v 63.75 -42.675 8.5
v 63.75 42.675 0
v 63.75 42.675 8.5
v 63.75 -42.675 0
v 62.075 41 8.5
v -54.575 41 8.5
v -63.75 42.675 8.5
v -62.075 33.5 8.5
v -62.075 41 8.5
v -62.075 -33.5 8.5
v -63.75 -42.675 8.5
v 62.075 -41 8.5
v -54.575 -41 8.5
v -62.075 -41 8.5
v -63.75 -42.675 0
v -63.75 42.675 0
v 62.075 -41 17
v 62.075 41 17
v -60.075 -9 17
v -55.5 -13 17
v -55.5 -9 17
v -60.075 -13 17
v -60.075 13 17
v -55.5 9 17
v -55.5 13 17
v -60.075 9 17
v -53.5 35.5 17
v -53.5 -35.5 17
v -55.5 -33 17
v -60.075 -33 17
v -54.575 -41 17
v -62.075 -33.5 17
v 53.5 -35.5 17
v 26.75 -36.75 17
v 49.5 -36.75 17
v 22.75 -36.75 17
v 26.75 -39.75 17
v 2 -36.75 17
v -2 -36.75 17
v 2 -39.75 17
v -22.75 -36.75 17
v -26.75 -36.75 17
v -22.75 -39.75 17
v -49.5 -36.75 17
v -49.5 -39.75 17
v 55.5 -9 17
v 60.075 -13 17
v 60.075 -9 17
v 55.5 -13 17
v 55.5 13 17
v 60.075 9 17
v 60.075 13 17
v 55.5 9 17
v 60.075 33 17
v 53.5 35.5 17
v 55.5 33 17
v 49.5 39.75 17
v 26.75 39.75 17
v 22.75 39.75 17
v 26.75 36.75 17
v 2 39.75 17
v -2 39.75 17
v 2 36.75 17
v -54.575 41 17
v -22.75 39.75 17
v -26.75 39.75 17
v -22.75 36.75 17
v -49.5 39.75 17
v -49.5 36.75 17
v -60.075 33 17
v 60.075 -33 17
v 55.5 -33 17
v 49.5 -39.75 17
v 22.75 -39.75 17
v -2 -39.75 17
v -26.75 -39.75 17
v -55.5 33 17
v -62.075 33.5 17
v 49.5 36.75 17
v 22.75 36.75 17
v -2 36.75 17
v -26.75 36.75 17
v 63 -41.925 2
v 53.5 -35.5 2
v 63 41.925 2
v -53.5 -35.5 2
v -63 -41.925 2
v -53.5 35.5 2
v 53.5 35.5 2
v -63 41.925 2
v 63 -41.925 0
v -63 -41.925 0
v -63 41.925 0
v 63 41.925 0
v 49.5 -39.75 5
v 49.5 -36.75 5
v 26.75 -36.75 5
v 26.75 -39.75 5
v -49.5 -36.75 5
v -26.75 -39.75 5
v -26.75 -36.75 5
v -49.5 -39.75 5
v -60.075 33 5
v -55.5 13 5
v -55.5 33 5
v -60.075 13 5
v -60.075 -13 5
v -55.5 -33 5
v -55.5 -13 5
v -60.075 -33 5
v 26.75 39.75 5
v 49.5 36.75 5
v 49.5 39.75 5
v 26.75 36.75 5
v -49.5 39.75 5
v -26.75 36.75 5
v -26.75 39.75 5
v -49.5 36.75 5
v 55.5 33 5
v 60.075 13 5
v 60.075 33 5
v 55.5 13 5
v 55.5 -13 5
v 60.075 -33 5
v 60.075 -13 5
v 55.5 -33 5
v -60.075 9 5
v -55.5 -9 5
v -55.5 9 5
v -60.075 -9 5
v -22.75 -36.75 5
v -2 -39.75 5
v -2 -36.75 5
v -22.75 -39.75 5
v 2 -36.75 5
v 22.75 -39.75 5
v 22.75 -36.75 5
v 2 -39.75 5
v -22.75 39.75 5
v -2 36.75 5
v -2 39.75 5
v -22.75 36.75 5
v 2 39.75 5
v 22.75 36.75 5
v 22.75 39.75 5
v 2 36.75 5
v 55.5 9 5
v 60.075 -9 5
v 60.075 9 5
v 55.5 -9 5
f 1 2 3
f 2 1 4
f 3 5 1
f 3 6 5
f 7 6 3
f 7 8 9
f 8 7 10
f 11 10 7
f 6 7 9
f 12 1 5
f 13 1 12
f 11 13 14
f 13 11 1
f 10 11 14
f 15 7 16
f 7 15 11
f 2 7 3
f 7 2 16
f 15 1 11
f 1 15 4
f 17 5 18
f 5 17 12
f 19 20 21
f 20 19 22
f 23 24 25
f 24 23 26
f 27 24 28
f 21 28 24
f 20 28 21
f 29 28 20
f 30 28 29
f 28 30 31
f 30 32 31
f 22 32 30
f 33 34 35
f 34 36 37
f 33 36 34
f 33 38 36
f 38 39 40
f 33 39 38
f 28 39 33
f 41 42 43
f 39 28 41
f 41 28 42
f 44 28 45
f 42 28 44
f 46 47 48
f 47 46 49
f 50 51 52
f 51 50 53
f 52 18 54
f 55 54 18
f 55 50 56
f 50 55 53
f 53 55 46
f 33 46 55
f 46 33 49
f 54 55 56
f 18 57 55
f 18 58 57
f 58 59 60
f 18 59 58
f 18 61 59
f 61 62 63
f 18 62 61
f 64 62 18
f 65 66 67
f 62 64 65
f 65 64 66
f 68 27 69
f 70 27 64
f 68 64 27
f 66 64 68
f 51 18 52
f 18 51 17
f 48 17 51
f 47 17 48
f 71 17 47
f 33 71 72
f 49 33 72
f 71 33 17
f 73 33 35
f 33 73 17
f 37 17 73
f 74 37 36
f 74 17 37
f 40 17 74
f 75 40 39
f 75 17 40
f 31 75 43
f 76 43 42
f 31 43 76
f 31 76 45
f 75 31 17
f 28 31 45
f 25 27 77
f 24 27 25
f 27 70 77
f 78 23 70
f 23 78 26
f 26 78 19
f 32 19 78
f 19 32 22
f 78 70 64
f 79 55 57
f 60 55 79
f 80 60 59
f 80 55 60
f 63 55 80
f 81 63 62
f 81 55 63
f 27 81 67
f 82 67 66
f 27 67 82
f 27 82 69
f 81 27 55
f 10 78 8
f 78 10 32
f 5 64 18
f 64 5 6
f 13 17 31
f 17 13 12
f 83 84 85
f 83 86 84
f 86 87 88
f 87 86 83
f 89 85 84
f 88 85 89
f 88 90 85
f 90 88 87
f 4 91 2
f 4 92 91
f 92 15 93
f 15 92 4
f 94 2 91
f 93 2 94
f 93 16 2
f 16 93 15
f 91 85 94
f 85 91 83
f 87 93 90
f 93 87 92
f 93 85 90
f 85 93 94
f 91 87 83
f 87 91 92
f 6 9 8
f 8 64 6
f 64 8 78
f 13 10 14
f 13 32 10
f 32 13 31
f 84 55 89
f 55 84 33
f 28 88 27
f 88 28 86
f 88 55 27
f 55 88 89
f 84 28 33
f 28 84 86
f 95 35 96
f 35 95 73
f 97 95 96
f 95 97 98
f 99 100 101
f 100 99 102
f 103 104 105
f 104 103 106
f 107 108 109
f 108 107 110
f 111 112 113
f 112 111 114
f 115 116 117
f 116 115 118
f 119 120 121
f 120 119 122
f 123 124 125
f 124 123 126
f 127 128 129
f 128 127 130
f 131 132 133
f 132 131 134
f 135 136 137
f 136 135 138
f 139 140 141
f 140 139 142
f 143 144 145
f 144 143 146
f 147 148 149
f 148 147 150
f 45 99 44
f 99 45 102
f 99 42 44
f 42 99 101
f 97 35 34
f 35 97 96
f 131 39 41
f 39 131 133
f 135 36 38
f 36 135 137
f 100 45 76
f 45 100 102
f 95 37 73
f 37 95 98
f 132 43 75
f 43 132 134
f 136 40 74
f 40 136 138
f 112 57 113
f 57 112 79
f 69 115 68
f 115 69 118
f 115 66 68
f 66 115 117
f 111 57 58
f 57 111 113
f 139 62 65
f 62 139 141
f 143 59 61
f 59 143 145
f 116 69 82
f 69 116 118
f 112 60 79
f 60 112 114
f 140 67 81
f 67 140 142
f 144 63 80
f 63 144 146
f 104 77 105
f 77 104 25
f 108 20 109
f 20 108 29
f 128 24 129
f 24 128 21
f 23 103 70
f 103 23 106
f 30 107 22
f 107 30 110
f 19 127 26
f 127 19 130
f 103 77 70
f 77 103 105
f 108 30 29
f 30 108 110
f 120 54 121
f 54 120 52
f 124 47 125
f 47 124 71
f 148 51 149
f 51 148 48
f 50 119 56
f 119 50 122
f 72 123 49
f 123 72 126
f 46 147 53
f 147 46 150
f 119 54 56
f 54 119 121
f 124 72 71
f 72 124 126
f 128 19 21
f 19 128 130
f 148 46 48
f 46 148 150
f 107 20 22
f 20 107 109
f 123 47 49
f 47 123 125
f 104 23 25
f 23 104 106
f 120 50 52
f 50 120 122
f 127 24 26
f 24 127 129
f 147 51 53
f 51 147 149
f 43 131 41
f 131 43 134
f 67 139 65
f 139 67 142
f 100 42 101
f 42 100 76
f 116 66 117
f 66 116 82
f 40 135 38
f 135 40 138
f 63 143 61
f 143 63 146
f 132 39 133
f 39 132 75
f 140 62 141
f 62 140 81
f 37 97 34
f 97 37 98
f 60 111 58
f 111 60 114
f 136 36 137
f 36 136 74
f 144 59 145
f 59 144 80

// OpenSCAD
// Generated by SolidPython 1.1.3 on 2024-11-01 12:00:23


difference() {
	union() {
		translate(v = [0, 22.0000000000, 0]) {
			translate(v = [0, -33.0000000000, 11.0000000000]) {
				cube(center = true, size = [124.1500000000, 4, 12]);
			}
		}
		translate(v = [0, 44.0000000000, 0]) {
			translate(v = [0, -33.0000000000, 11.0000000000]) {
				cube(center = true, size = [124.1500000000, 4, 12]);
			}
		}
		translate(v = [24.7500000000, 0, 0]) {
			translate(v = [-49.5000000000, 0, 11.0000000000]) {
				cube(center = true, size = [4, 82, 12]);
			}
		}
		translate(v = [49.5000000000, 0, 0]) {
			translate(v = [-49.5000000000, 0, 11.0000000000]) {
				cube(center = true, size = [4, 82, 12]);
			}
		}
		translate(v = [74.2500000000, 0, 0]) {
			translate(v = [-49.5000000000, 0, 11.0000000000]) {
				cube(center = true, size = [4, 82, 12]);
			}
		}
		difference() {
			difference() {
				difference() {
					difference() {
						union() {
							difference() {
								union() {
									translate(v = [0, 0, 4.2500000000]) {
										cube(center = true, size = [127.5000000000, 85.3500000000, 8.5000000000]);
									}
									translate(v = [0, 0, 12.7500000000]) {
										cube(center = true, size = [124.1500000000, 82, 8.5000000000]);
									}
								}
								translate(v = [0, 0, 1.0000000000]) {
									cube(center = true, size = [127.5000000000, 85.3500000000, 2]);
								}
							}
							intersection() {
								difference() {
									translate(v = [0, 0, 1.0000000000]) {
										cube(center = true, size = [127.5000000000, 85.3500000000, 2]);
									}
									translate(v = [0, 0, 1.0000000000]) {
										cube(center = true, size = [126.0000000000, 83.8500000000, 2]);
									}
								}
								union() {
									translate(v = [-63.7500000000, 42.6750000000, 0]) {
										translate(v = [0, 0, 1.0000000000]) {
											cube(center = true, size = [127.5000000000, 85.3500000000, 2]);
										}
									}
									translate(v = [63.7500000000, 42.6750000000, 0]) {
										translate(v = [0, 0, 1.0000000000]) {
											cube(center = true, size = [127.5000000000, 85.3500000000, 2]);
										}
									}
									translate(v = [-63.7500000000, -42.6750000000, 0]) {
										translate(v = [0, 0, 1.0000000000]) {
											cube(center = true, size = [127.5000000000, 85.3500000000, 2]);
										}
									}
									translate(v = [63.7500000000, -42.6750000000, 0]) {
										translate(v = [0, 0, 1.0000000000]) {
											cube(center = true, size = [127.5000000000, 85.3500000000, 2]);
										}
									}
								}
							}
						}
						union() {
							translate(v = [-62.0750000000, 41.0000000000, 8.5000000000]) {
								translate(v = [0, -7.5000000000, 0]) {
									linear_extrude(height = 8.5000000000) {
										polygon(points = [[0, 0], [0, 7.5000000000], [0, 7.5000000000], [0, 7.5000000000], [7.5000000000, 7.5000000000], [7.5000000000, 7.5000000000]]);
									}
								}
							}
							translate(v = [-62.0750000000, -41.0000000000, 8.5000000000]) {
								translate(v = [7.5000000000, 0, 0]) {
									rotate(a = 90) {
										linear_extrude(height = 8.5000000000) {
											polygon(points = [[0, 0], [0, 7.5000000000], [0, 7.5000000000], [0, 7.5000000000], [7.5000000000, 7.5000000000], [7.5000000000, 7.5000000000]]);
										}
									}
								}
							}
						}
					}
					translate(v = [0, 0, 8.5000000000]) {
						cube(center = true, size = [107, 71, 17.0000000000]);
					}
				}
				union() {
					translate(v = [0, -38.25, 0]) {
						translate(v = [0, 0, 11.0000000000]) {
							cube(center = true, size = [99, 3.0000000000, 12]);
						}
					}
					translate(v = [0, 38.25, 0]) {
						translate(v = [0, 0, 11.0000000000]) {
							cube(center = true, size = [99, 3.0000000000, 12]);
						}
					}
					translate(v = [-57.7875, 0, 0]) {
						translate(v = [0, 0, 11.0000000000]) {
							cube(center = true, size = [4.5750000000, 66, 12]);
						}
					}
					translate(v = [57.7875, 0, 0]) {
						translate(v = [0, 0, 11.0000000000]) {
							cube(center = true, size = [4.5750000000, 66, 12]);
						}
					}
				}
			}
			union() {
				translate(v = [0, 0, 17.0000000000]) {
					cube(center = true, size = [115.575, 66, 0]);
				}
				translate(v = [0, 0, 17.0000000000]) {
					cube(center = true, size = [99, 76.5, 0]);
				}
			}
		}
	}
	translate(v = [0, 0, 8.5000000000]) {
		cube(center = true, size = [107, 71, 17.0000000000]);
	}
}
/***********************************************
*********      SolidPython code:      **********
************************************************
 
import solid
import numpy as np
from make_device import make_unit_array
import os.path as osp
import os 
import math

chamfer_extrude=solid.import_scad("./chamfer_extrude.scad")
chamfer_extrude=chamfer_extrude.chamfer_extrude
version="print_PP_v1"
base_name="96_well_plate_reservoirs_"+version
base_path="./plates/"+base_name
#basic plate dims
plate_size_outer=[127.5,85.35]
plate_size_inner=[124.15,82]
plate_height_outer=8.5
plate_height_inner=8.5
plate_height=plate_height_inner+plate_height_outer
plate_under_depth=2
skirt_thickness=1.5
skirt_hole_dims=[plate_size_outer[0],plate_size_outer[1]]
corner_x=7.5
corner_y=7.5
grid_size=[1,1]
#device_tol=2
#dims = [110-device_tol,74-device_tol,0]
#device_dims=[110-device_tol,74-device_tol]
dims = [107,71,0]
device_dims=[107,71]
reservoir_x_tol=8
reservoir_y_tol=5
reservoir_dims_x=[device_dims[0]-reservoir_x_tol,(plate_size_inner[1]-device_dims[1]-reservoir_y_tol)/2.0]
reservoir_dims_y=[(plate_size_inner[0]-device_dims[0]-reservoir_x_tol)/2.0,device_dims[1]-reservoir_y_tol]
reservoir_depth=12
lower_wall_height=0
release_holes=False
release_radius=2.5
reservoir_number_x=3
reservoir_number_y=4
reservoir_wall_thickness=4


def save_model(model,base_path,base_name):
    if not osp.exists(base_path):
        os.makedirs(base_path)
    scad_path=osp.join(base_path,base_name+".scad")
    solid.scad_render_to_file(model,osp.join(scad_path))

def center_unit_array(model,dims,grid_size):
    model = solid.translate([dims[0]/2.0,dims[1]/2.0,0])(model)
    model = solid.translate([-dims[0]*(grid_size[0]/2.0),
                             -dims[1]*(grid_size[1]/2.0),0])(model)
    return model


#plate_chassis
plate_height_diff=plate_height-plate_height_inner

#outer_plate as base
plate=solid.cube((*plate_size_outer,plate_height_diff),center=True)
plate=solid.translate([0,0,plate_height_diff/2.0])(plate)
#inner plate goes on top
plate_inner=solid.cube((*plate_size_inner,plate_height_inner),center=True)
plate_inner=solid.translate([0,0,plate_height_inner/2.0+plate_height_diff])(plate_inner)
plate=solid.union()(plate,plate_inner)


plate_under_remove_out=solid.cube((*plate_size_outer,plate_under_depth),center=True)
plate_under_remove_out=solid.translate([0,0,plate_under_depth/2.0])(plate_under_remove_out)
plate_under_remove_in=solid.cube((plate_size_outer[0]-skirt_thickness,plate_size_outer[1]-skirt_thickness,plate_under_depth),center=True)
plate_under_remove_in=solid.translate([0,0,plate_under_depth/2.0])(plate_under_remove_in)

plate_under_remove=solid.difference()(plate_under_remove_out,plate_under_remove_in)

corners_from_x_y = lambda x,y: [[-x/2.0,y/2.0],
                                    [x/2.0, y/2.0],
                                    [-x/2.0, -y/2.0],
                                    [x/2.0, -y/2.0]]
plate_under_remove_corner=solid.cube((*skirt_hole_dims,plate_under_depth),center=True)
plate_under_remove_corner=solid.translate([0,0,plate_under_depth/2.0])(plate_under_remove_corner)
plate_corners_pos=corners_from_x_y(*plate_size_outer)
plate_under_remove_corners=[]
for corner_pos in plate_corners_pos:
    temp_corner=solid.translate([*corner_pos,0])(plate_under_remove_corner)
    plate_under_remove_corners.append(temp_corner)

corners_remove=solid.union()(*plate_under_remove_corners)
skirt=solid.intersection()(plate_under_remove,corners_remove)
#chamfer skirt
#skirt=solid.projection()(skirt)
#skirt=chamfer_extrude(plate_under_depth,45,segments=20)(skirt)
#skirt=solid.linear_extrude(height=plate_under_depth)(skirt)
#skirt=solid.intersection()(plate,skirt)
#
#skirt=solid.translate([0,0,-plate_under_depth/2.0])(skirt)
#skirt=solid.rotate([0,180,0])(skirt)
#skirt=solid.translate([0,0,plate_under_depth/2.0])(skirt)

plate=solid.difference()(plate,plate_under_remove_out)
plate=solid.union()(plate,skirt)



#corners
#               0       1        2        3         4          5
corner_points=[[0,0,0],[0,corner_y,10],[0,corner_y,0],[0,corner_y,10],[corner_x,corner_y,10],[corner_x,corner_y,0]]
corner=solid.polygon(points=corner_points)()
corner=solid.linear_extrude(height=plate_height_inner)(corner)

corner_top_left=corner
corner_top_left=solid.translate([0,-corner_y,0])(corner_top_left)
corner_top_left=solid.translate([-plate_size_inner[0]/2.0,plate_size_inner[1]/2.0,plate_height_diff])(corner_top_left)

corner_bottom_left=solid.rotate(90)(corner)
corner_bottom_left=solid.translate([corner_x,0,0])(corner_bottom_left)
corner_bottom_left=solid.translate([-plate_size_inner[0]/2.0,-plate_size_inner[1]/2.0,plate_height_diff])(corner_bottom_left)

corners = solid.union()(corner_top_left,corner_bottom_left)
#corners = solid.union()(corner_top_left)
plate=solid.difference()(plate,corners)

device_dims = np.array(device_dims)
device_slot = solid.cube((*device_dims,plate_height),center=True)
device_slot = solid.translate([0,0,plate_height/2.0])(device_slot)
plate = solid.difference()(plate,device_slot)

#reservoirs
reservoir_x = solid.cube((*reservoir_dims_x,reservoir_depth),center=True)
reservoir_x = solid.translate([0,0,plate_height-reservoir_depth/2.0])(reservoir_x)
reservoir_y = solid.cube((*reservoir_dims_y,reservoir_depth),center=True)
reservoir_y = solid.translate([0,0,plate_height-reservoir_depth/2.0])(reservoir_y)
plate_top_x_thickness=(plate_size_inner[0]-device_dims[0])/2.0
x_pos_reservoir=plate_size_inner[0]/2.0-plate_top_x_thickness/2.0
plate_top_y_thickness=(plate_size_inner[1]-device_dims[1])/2.0
y_pos_reservoir=plate_size_inner[1]/2.0-plate_top_y_thickness/2.0
reservoir_x_top = solid.translate([0,y_pos_reservoir,0])(reservoir_x)
reservoir_x_bottom = solid.translate([0,-y_pos_reservoir,0])(reservoir_x)
reservoir_y_left = solid.translate([x_pos_reservoir,0,0])(reservoir_y)
reservoir_y_right = solid.translate([-x_pos_reservoir,0,0])(reservoir_y)




reservoir_x_wall = solid.cube((plate_size_inner[0],reservoir_wall_thickness,reservoir_depth),center=True)
reservoir_x_wall = solid.translate([0,-reservoir_dims_y[1]/2.0,plate_height-reservoir_depth/2.0])(reservoir_x_wall)
reservoir_x_walls = [] 
spacing_x=reservoir_dims_y[1]/reservoir_number_x

reservoir_y_wall = solid.cube((reservoir_wall_thickness,plate_size_inner[1],reservoir_depth),center=True)
reservoir_y_wall = solid.translate([-reservoir_dims_x[0]/2.0,0,plate_height-reservoir_depth/2.0])(reservoir_y_wall)
reservoir_y_walls = [] 
spacing_y=reservoir_dims_x[0]/reservoir_number_y


reservoirs = solid.union()(reservoir_x_bottom,reservoir_x_top,reservoir_y_right,reservoir_y_left)
plate = solid.difference()(plate,reservoirs)
reservoir_lower_wall_x = solid.cube((reservoir_dims_x[0],y_pos_reservoir*2,lower_wall_height),center=True)
reservoir_lower_wall_x = solid.translate([0,0,plate_height-lower_wall_height/2.0])(reservoir_lower_wall_x)
reservoir_lower_wall_y = solid.cube((x_pos_reservoir*2,reservoir_dims_y[1],lower_wall_height),center=True)
reservoir_lower_wall_y = solid.translate([0,0,plate_height-lower_wall_height/2.0])(reservoir_lower_wall_y)
reservoir_lower_wall = solid.union()(reservoir_lower_wall_y,reservoir_lower_wall_x)
plate = solid.difference()(plate,reservoir_lower_wall)



#release holes
release_x = solid.cylinder(r=release_radius, h=plate_size_inner[0],segments=64,center=True)
release_x = solid.rotate([0,90,0])(release_x)
release_x = solid.translate([0,-spacing_x/2.0,0])(release_x)
release_y = solid.cylinder(r=release_radius, h=plate_size_inner[1],segments=64,center=True)
release_y = solid.rotate([90,0,0])(release_y)
release_y = solid.translate([-spacing_y/2.0,0,0])(release_y)
release_holes = []

for i in range(reservoir_number_x-1):
    reservoir_x_walls.append(solid.translate([0,spacing_x*(i+1),0])(reservoir_x_wall))

release_x = solid.translate([0,-reservoir_dims_y[1]/2.0,0])(release_x)
for i in range(reservoir_number_x):
    release_holes.append(solid.translate([0,spacing_x*(i+1),0])(release_x))


for i in range(reservoir_number_y-1):
    reservoir_y_walls.append(solid.translate([spacing_y*(i+1),0,0])(reservoir_y_wall))

release_y = solid.translate([-reservoir_dims_x[0]/2.0,0,0])(release_y)
for i in range(reservoir_number_y):
    release_holes.append(solid.translate([spacing_y*(i+1),0,0])(release_y))


release_holes = solid.union()(*release_holes)
release_holes = solid.translate([0,0,plate_height])(release_holes)
if release_holes is True:
    plate = solid.difference()(plate,release_holes)
plate = solid.union()(*reservoir_x_walls,*reservoir_y_walls,plate)
plate = solid.difference()(plate,device_slot)

save_model(plate,base_path,base_name)
 
 
************************************************/
